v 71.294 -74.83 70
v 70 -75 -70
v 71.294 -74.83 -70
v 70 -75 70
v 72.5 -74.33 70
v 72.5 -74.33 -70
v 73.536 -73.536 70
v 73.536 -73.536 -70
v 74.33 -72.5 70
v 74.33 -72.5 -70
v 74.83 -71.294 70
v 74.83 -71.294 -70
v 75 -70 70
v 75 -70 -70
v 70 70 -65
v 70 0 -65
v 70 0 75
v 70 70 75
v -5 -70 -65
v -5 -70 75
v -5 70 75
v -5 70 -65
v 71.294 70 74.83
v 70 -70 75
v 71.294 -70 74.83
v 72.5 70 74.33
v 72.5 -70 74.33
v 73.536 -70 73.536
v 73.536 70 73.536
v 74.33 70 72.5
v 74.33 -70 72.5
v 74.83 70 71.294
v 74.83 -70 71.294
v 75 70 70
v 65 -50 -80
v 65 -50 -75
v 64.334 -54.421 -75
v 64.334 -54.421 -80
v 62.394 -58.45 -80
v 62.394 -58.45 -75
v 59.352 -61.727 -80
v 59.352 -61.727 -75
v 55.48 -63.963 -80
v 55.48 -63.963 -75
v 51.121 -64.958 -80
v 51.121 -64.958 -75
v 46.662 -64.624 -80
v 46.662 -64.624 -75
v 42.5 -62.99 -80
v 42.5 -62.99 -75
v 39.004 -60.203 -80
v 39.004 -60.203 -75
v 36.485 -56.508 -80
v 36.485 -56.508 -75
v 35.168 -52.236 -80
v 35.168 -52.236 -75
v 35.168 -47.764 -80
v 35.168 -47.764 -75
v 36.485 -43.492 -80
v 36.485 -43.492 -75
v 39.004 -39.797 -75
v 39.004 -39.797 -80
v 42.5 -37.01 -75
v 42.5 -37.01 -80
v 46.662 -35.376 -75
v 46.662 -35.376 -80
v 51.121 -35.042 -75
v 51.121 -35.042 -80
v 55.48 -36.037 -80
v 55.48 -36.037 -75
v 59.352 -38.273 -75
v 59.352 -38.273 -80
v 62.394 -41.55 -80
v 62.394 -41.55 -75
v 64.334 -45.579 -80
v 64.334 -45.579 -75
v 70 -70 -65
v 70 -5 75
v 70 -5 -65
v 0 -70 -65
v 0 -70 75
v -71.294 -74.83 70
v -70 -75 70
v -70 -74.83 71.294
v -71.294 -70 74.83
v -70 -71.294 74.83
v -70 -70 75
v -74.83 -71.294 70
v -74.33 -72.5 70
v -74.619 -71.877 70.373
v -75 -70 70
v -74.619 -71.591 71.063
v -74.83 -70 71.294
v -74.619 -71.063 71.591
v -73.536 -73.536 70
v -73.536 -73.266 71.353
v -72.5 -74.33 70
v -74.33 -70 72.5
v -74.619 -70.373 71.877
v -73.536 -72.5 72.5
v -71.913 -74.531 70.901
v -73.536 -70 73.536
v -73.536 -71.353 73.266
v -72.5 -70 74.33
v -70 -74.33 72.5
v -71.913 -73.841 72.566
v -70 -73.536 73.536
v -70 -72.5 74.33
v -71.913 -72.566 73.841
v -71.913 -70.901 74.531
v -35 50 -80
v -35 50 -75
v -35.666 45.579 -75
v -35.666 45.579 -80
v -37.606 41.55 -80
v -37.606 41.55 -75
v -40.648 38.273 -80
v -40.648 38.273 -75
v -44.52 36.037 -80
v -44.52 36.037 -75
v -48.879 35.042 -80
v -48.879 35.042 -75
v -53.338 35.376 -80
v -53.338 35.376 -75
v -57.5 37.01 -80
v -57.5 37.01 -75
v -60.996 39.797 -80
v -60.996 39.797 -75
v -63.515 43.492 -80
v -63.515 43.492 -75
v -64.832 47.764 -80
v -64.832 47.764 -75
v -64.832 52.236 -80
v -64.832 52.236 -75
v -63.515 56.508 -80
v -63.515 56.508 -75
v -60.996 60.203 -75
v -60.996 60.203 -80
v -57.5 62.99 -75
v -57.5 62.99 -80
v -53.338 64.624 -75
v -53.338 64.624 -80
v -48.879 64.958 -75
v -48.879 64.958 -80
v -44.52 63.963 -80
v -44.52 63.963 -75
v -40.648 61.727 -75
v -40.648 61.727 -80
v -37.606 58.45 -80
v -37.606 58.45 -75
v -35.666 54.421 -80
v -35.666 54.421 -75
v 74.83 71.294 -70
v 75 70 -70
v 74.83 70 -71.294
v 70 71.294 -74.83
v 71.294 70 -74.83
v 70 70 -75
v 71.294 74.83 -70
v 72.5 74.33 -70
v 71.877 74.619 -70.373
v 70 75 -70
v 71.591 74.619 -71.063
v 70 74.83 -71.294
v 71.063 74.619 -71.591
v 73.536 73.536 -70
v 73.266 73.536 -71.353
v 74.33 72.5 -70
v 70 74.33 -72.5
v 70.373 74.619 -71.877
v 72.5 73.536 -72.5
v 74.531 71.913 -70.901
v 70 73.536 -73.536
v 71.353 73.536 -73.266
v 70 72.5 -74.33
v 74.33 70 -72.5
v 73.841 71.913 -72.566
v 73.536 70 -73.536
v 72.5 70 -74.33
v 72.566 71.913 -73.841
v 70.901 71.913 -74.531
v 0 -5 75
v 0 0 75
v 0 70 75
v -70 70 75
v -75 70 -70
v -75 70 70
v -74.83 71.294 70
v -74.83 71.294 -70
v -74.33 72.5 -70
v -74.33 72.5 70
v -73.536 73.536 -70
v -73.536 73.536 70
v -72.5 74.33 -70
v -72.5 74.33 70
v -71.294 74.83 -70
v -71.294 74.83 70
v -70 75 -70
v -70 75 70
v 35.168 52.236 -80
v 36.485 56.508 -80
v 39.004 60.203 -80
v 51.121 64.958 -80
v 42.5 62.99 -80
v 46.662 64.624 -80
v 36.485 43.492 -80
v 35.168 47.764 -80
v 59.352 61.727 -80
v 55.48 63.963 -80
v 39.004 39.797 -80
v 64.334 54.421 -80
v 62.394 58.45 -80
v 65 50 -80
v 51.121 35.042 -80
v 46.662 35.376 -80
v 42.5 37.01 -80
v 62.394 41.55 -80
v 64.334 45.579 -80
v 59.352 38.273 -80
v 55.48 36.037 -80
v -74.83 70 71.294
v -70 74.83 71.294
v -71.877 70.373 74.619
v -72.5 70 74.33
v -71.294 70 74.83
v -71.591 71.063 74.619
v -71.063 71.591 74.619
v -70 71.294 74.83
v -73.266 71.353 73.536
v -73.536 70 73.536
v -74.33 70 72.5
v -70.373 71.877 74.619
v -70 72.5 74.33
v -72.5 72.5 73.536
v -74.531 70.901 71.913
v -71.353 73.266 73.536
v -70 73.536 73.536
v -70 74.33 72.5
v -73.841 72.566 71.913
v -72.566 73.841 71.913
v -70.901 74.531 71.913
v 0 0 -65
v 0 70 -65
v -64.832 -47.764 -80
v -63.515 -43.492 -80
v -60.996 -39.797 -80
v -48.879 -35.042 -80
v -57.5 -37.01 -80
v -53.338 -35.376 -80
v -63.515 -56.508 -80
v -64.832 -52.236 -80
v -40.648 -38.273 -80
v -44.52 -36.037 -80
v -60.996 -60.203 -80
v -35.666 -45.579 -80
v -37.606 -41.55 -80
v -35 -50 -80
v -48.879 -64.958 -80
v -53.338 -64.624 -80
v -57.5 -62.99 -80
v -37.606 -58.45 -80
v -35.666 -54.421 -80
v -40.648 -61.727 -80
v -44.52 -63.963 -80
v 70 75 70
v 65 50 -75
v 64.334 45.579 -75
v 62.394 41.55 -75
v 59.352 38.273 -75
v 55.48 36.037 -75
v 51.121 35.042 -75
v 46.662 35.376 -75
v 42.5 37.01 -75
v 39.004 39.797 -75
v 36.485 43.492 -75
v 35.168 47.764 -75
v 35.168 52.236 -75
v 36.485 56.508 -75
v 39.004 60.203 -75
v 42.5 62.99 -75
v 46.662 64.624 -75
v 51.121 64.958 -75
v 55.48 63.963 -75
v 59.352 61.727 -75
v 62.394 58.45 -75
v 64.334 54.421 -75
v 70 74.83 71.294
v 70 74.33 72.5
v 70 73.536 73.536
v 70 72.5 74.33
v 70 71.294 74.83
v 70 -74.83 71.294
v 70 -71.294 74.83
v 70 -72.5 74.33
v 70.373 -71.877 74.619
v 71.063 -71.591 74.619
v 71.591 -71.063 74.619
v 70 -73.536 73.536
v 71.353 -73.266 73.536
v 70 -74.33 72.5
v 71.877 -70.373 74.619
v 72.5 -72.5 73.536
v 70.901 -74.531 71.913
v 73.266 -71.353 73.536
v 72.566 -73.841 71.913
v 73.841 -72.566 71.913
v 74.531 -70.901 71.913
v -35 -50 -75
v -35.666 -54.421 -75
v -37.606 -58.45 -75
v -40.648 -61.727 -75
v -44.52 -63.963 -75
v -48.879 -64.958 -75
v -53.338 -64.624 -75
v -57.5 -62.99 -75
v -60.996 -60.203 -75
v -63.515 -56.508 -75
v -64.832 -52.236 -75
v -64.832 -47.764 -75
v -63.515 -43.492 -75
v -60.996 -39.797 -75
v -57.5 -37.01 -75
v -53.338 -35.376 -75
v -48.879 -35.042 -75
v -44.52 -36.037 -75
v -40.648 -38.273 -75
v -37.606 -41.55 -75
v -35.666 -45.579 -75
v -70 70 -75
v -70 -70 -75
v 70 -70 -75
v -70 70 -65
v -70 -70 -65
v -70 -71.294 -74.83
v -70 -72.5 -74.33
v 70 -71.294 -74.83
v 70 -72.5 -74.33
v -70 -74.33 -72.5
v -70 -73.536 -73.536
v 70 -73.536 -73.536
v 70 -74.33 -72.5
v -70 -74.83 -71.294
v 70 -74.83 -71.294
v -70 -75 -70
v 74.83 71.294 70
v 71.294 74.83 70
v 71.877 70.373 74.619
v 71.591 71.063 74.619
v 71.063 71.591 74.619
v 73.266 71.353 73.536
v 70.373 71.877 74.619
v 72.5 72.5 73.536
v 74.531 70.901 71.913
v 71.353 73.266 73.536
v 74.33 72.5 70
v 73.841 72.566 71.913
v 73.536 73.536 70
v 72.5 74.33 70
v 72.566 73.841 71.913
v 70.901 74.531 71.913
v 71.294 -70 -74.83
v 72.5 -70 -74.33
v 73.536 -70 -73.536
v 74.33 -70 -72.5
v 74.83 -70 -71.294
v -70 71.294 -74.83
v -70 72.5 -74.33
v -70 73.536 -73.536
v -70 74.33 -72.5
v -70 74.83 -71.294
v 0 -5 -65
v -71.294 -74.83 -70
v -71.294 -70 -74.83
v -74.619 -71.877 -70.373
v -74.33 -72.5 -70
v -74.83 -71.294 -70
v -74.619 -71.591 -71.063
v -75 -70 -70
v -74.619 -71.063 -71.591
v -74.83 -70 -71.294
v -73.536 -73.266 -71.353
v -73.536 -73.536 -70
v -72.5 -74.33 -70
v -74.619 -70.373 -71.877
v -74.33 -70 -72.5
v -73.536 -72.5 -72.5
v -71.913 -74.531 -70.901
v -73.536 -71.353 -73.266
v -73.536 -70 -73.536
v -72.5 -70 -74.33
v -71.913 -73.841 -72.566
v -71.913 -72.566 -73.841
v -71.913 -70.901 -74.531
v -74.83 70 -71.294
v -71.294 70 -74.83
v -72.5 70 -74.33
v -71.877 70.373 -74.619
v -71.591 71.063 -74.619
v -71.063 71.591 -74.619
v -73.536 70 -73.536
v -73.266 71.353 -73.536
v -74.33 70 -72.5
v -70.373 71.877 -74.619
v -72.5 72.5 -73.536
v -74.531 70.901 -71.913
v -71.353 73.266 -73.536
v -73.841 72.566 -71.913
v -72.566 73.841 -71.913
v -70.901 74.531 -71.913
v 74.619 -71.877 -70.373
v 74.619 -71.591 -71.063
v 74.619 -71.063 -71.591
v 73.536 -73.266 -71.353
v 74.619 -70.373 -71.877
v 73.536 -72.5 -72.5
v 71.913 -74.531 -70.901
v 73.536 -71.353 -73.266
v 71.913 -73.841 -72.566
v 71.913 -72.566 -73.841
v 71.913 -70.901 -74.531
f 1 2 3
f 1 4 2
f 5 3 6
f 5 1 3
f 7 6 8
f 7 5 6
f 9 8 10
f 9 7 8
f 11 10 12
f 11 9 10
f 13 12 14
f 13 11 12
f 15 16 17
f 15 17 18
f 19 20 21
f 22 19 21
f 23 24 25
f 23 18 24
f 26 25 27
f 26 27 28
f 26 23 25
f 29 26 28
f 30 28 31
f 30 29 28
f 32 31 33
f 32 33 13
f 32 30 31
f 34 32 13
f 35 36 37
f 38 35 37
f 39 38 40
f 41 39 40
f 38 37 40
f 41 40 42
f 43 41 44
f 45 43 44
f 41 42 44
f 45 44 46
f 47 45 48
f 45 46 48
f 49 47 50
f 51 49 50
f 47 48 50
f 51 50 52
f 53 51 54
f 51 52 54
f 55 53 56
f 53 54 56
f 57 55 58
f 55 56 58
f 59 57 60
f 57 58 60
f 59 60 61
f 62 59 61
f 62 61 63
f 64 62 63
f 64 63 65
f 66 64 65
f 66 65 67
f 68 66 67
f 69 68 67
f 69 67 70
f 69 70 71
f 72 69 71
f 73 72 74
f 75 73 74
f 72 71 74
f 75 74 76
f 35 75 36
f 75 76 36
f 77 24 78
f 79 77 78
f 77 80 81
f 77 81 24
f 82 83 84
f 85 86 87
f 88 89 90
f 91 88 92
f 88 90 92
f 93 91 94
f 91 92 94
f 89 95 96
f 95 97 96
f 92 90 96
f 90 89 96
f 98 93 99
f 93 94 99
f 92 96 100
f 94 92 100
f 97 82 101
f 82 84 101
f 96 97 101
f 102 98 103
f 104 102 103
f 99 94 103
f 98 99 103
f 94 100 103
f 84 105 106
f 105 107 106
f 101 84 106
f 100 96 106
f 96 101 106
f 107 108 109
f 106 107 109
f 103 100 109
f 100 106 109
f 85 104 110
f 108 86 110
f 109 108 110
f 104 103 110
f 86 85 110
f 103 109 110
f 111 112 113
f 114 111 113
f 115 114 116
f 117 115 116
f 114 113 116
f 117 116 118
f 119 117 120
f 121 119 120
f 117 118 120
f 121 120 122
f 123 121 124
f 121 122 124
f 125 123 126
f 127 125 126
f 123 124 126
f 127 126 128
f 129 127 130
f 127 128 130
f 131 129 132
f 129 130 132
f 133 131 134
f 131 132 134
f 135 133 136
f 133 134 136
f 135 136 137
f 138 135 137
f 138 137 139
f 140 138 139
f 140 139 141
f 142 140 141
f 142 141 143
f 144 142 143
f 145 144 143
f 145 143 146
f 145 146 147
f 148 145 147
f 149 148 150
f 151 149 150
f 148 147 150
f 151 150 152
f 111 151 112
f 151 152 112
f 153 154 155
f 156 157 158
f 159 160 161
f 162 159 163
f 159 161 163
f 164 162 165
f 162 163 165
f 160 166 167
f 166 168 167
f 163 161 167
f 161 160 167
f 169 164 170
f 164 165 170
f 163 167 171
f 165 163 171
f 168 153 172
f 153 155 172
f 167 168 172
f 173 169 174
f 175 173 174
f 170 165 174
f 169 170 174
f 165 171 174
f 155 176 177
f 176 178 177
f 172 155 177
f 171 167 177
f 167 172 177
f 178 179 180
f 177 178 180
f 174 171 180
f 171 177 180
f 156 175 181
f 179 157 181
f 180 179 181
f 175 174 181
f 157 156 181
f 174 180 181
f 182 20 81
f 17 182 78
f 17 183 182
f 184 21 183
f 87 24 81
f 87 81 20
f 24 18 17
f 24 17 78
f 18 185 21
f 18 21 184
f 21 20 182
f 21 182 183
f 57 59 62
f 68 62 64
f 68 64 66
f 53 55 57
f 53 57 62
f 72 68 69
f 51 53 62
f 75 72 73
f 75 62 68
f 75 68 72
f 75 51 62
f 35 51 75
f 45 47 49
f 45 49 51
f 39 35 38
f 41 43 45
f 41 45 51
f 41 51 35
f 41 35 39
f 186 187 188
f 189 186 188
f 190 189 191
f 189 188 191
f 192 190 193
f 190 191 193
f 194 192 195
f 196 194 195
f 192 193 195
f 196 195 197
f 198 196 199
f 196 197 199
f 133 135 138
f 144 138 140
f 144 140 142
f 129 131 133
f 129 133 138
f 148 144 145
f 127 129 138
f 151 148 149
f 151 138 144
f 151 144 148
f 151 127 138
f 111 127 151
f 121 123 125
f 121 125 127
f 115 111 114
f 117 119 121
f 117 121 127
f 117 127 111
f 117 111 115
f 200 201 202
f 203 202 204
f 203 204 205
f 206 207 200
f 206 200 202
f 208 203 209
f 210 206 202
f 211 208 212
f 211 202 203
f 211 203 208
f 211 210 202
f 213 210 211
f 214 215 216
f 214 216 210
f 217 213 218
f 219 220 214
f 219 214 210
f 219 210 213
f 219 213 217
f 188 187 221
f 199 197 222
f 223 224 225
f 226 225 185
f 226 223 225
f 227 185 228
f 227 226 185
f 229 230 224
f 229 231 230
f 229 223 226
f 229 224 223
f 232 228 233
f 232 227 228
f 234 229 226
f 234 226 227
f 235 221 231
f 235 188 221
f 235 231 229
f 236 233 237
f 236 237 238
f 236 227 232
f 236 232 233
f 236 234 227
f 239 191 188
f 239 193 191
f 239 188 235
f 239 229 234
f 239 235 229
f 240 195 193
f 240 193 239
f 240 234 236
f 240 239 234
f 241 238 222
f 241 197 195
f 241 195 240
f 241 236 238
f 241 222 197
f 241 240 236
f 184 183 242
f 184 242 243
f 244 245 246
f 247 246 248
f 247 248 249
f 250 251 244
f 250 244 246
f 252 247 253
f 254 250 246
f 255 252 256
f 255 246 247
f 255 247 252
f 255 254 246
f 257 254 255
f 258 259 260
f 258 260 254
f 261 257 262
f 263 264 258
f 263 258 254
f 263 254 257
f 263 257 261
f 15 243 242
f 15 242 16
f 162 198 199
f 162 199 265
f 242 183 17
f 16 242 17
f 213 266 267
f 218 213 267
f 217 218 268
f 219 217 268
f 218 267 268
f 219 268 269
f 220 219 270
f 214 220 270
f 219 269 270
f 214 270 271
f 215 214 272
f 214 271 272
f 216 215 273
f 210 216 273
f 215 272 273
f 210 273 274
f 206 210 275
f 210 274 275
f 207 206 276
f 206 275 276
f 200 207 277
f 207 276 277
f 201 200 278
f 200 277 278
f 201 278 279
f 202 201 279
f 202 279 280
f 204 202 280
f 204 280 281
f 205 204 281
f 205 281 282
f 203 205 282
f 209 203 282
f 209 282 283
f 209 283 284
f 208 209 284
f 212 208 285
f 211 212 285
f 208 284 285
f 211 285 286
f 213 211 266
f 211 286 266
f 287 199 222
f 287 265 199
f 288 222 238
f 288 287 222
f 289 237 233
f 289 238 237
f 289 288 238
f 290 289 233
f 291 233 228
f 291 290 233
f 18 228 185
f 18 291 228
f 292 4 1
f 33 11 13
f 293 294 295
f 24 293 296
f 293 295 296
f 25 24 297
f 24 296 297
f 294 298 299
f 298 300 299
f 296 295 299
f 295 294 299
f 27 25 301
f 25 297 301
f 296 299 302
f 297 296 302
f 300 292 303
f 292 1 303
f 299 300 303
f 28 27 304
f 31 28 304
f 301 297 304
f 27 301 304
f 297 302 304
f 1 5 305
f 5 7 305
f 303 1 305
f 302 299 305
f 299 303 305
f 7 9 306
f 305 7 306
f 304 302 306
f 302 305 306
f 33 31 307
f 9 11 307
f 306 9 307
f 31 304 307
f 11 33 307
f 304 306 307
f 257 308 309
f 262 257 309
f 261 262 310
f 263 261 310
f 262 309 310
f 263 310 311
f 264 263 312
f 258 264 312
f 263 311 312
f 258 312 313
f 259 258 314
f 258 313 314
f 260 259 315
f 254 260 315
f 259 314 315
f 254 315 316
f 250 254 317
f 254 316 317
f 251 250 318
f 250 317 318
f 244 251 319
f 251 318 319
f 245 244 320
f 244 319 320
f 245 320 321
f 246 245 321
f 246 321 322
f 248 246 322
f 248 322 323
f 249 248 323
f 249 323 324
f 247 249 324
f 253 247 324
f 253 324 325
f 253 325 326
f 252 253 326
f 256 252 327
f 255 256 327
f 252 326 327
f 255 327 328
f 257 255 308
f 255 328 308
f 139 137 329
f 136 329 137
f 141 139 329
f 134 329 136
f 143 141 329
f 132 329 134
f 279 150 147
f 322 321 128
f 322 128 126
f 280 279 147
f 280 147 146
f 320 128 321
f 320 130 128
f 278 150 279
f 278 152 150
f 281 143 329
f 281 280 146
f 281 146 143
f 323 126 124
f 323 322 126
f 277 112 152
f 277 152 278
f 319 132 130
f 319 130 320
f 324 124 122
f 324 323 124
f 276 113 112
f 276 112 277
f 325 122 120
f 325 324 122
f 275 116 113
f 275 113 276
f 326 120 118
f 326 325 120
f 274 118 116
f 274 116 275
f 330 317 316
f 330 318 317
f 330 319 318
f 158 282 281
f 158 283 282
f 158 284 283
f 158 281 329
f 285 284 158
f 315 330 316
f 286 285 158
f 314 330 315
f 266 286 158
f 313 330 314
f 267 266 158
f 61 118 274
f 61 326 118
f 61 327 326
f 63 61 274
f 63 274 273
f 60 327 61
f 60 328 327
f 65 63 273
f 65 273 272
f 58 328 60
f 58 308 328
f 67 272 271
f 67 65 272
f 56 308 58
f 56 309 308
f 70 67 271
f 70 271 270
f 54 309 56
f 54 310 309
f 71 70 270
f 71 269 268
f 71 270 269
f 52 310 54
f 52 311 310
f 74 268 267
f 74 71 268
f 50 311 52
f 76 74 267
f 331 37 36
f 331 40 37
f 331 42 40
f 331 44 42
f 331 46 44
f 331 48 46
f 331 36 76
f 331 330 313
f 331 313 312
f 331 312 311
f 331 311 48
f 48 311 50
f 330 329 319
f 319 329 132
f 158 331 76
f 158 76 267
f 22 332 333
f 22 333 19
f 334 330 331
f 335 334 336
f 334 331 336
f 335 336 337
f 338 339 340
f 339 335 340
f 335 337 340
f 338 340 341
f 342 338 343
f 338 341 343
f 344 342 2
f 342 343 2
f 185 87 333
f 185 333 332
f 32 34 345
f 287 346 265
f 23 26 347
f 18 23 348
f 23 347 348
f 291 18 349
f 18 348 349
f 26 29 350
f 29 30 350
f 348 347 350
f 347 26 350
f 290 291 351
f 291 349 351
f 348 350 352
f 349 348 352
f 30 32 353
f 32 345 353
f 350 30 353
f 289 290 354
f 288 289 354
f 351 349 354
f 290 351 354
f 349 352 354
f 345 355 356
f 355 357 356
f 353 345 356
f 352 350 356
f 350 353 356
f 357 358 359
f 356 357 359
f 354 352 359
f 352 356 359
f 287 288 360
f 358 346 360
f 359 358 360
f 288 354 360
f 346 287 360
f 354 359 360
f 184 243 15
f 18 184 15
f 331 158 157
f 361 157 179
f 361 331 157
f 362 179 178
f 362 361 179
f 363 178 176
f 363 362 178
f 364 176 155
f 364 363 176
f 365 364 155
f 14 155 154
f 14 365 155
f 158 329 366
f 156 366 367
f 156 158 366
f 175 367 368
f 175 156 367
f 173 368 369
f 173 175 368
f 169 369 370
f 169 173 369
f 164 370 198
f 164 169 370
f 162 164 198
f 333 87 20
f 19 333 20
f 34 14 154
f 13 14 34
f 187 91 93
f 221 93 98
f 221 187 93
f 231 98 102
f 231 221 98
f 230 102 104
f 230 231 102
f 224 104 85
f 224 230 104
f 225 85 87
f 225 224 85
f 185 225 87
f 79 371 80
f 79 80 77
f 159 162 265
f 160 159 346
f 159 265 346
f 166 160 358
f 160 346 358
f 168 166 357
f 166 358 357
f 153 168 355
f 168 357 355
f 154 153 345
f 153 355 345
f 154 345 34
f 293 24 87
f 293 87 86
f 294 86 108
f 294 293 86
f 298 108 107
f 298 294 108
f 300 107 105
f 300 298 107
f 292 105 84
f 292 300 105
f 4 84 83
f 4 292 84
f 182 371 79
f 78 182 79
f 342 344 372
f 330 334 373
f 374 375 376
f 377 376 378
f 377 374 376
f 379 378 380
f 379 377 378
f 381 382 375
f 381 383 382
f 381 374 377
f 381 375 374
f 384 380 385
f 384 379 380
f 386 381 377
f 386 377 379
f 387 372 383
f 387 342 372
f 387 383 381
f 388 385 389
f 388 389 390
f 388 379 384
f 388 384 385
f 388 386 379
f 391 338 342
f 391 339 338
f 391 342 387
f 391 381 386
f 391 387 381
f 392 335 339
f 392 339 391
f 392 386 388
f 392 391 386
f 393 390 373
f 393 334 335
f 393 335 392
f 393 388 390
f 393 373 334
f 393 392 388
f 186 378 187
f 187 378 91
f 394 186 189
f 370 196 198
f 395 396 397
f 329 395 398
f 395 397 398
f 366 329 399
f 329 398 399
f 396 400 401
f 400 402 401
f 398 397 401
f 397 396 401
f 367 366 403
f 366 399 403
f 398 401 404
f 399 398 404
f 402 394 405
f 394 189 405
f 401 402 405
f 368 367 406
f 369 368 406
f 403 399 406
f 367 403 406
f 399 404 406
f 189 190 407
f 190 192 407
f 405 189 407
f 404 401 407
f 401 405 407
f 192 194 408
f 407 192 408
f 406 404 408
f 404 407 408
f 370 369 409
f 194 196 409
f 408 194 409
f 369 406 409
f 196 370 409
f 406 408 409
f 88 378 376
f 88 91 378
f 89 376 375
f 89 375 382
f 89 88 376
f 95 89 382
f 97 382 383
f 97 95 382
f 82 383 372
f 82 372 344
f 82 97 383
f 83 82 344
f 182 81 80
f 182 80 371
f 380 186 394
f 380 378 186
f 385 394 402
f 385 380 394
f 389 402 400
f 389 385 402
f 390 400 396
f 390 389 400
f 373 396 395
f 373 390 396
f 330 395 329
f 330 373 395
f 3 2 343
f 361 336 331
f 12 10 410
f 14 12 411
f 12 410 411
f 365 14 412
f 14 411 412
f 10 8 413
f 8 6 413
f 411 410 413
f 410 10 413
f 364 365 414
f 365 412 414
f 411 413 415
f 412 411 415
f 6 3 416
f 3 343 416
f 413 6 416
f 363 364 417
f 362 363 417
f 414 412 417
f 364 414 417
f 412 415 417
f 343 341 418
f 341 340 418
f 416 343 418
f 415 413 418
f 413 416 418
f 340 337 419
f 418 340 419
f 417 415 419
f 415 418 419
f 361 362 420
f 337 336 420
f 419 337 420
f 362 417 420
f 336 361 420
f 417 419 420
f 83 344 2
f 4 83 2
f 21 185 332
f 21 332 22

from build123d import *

# Parameters (mm, degrees)
F0_W      = 150
F0_H      = 150
F1_DEPTH  = 75
F2_W      = 140
F2_H      = 140
F3_DEPTH  = 140
F4_R      = 4.99999
F5_W      = 70
F5_H      = 140
F6_DEPTH  = 140
F7_W      = 65
F7_H      = 140
F8_DEPTH  = 140
F9_W      = 70
F9_H      = 70
F10_DEPTH = 140
F11_W     = 70
F11_H     = 65
F12_DEPTH = 140
F13_R     = 15
F14_DEPTH = 5


# Not quite as in the source:
# - a fillet or chamfer is up to 0.001 mm smaller than in the source, because OpenCascade refuses the exact size


with BuildPart() as f1:
    # F0 (on Front) → F1 (new body, symmetric)
    with BuildSketch(Plane.XZ):
        Rectangle(F0_W, F0_H)
    extrude(amount=F1_DEPTH, both=True)

    # F2 (on face) → F3 (cut)
    with BuildSketch(Plane.XY.offset(75)):
        Rectangle(F2_W, F2_H)
    extrude(amount=-F3_DEPTH, mode=Mode.SUBTRACT)

    # F4 (radius 5 in the source; OpenCascade refuses exactly that, so slightly less here)
    f4_edges = [f1.edges().sort_by_distance(p)[0] for p in [
        (0, -75, -75),
        (75, -75, 0),
        (0, -75, 75),
        (-75, -75, 0),
        (75, 0, -75),
        (75, 75, 0),
        (75, 0, 75),
        (-75, 75, 0),
        (-75, 0, -75),
        (-75, 0, 75),
        (0, 75, -75),
        (0, 75, 75),
    ]]
    fillet(f4_edges, radius=F4_R)

    # F5 (on face) → F6 (join)
    with BuildSketch(Plane.XY.offset(-65)):
        with Locations((-35, 0)):
            Rectangle(F5_W, F5_H)
    extrude(amount=F6_DEPTH)

    # F7 (on face) → F8 (cut)
    with BuildSketch(Plane.XY.offset(75)):
        with Locations((-37.5, 0)):
            Rectangle(F7_W, F7_H)
    extrude(amount=-F8_DEPTH, mode=Mode.SUBTRACT)

    # F9 (on face) → F10 (join)
    with BuildSketch(Plane.XY.offset(-65)):
        with Locations((35, -35)):
            Rectangle(F9_W, F9_H)
    extrude(amount=F10_DEPTH)

    # F11 (on face) → F12 (cut)
    with BuildSketch(Plane.XY.offset(75)):
        with Locations((35, -37.5)):
            Rectangle(F11_W, F11_H)
    extrude(amount=-F12_DEPTH, mode=Mode.SUBTRACT)

    # F13 (on face) → F14 (join)
    with BuildSketch(Plane(origin=(0, 0, -75), x_dir=(1, 0, 0), z_dir=(0, 0, -1))):
        with Locations((-50, 50)):
            Circle(F13_R)
        with Locations((50, 50)):
            Circle(F13_R)
        with Locations((50, -50)):
            Circle(F13_R)
        with Locations((-50, -50)):
            Circle(F13_R)
    extrude(amount=F14_DEPTH)


solid = f1.part
